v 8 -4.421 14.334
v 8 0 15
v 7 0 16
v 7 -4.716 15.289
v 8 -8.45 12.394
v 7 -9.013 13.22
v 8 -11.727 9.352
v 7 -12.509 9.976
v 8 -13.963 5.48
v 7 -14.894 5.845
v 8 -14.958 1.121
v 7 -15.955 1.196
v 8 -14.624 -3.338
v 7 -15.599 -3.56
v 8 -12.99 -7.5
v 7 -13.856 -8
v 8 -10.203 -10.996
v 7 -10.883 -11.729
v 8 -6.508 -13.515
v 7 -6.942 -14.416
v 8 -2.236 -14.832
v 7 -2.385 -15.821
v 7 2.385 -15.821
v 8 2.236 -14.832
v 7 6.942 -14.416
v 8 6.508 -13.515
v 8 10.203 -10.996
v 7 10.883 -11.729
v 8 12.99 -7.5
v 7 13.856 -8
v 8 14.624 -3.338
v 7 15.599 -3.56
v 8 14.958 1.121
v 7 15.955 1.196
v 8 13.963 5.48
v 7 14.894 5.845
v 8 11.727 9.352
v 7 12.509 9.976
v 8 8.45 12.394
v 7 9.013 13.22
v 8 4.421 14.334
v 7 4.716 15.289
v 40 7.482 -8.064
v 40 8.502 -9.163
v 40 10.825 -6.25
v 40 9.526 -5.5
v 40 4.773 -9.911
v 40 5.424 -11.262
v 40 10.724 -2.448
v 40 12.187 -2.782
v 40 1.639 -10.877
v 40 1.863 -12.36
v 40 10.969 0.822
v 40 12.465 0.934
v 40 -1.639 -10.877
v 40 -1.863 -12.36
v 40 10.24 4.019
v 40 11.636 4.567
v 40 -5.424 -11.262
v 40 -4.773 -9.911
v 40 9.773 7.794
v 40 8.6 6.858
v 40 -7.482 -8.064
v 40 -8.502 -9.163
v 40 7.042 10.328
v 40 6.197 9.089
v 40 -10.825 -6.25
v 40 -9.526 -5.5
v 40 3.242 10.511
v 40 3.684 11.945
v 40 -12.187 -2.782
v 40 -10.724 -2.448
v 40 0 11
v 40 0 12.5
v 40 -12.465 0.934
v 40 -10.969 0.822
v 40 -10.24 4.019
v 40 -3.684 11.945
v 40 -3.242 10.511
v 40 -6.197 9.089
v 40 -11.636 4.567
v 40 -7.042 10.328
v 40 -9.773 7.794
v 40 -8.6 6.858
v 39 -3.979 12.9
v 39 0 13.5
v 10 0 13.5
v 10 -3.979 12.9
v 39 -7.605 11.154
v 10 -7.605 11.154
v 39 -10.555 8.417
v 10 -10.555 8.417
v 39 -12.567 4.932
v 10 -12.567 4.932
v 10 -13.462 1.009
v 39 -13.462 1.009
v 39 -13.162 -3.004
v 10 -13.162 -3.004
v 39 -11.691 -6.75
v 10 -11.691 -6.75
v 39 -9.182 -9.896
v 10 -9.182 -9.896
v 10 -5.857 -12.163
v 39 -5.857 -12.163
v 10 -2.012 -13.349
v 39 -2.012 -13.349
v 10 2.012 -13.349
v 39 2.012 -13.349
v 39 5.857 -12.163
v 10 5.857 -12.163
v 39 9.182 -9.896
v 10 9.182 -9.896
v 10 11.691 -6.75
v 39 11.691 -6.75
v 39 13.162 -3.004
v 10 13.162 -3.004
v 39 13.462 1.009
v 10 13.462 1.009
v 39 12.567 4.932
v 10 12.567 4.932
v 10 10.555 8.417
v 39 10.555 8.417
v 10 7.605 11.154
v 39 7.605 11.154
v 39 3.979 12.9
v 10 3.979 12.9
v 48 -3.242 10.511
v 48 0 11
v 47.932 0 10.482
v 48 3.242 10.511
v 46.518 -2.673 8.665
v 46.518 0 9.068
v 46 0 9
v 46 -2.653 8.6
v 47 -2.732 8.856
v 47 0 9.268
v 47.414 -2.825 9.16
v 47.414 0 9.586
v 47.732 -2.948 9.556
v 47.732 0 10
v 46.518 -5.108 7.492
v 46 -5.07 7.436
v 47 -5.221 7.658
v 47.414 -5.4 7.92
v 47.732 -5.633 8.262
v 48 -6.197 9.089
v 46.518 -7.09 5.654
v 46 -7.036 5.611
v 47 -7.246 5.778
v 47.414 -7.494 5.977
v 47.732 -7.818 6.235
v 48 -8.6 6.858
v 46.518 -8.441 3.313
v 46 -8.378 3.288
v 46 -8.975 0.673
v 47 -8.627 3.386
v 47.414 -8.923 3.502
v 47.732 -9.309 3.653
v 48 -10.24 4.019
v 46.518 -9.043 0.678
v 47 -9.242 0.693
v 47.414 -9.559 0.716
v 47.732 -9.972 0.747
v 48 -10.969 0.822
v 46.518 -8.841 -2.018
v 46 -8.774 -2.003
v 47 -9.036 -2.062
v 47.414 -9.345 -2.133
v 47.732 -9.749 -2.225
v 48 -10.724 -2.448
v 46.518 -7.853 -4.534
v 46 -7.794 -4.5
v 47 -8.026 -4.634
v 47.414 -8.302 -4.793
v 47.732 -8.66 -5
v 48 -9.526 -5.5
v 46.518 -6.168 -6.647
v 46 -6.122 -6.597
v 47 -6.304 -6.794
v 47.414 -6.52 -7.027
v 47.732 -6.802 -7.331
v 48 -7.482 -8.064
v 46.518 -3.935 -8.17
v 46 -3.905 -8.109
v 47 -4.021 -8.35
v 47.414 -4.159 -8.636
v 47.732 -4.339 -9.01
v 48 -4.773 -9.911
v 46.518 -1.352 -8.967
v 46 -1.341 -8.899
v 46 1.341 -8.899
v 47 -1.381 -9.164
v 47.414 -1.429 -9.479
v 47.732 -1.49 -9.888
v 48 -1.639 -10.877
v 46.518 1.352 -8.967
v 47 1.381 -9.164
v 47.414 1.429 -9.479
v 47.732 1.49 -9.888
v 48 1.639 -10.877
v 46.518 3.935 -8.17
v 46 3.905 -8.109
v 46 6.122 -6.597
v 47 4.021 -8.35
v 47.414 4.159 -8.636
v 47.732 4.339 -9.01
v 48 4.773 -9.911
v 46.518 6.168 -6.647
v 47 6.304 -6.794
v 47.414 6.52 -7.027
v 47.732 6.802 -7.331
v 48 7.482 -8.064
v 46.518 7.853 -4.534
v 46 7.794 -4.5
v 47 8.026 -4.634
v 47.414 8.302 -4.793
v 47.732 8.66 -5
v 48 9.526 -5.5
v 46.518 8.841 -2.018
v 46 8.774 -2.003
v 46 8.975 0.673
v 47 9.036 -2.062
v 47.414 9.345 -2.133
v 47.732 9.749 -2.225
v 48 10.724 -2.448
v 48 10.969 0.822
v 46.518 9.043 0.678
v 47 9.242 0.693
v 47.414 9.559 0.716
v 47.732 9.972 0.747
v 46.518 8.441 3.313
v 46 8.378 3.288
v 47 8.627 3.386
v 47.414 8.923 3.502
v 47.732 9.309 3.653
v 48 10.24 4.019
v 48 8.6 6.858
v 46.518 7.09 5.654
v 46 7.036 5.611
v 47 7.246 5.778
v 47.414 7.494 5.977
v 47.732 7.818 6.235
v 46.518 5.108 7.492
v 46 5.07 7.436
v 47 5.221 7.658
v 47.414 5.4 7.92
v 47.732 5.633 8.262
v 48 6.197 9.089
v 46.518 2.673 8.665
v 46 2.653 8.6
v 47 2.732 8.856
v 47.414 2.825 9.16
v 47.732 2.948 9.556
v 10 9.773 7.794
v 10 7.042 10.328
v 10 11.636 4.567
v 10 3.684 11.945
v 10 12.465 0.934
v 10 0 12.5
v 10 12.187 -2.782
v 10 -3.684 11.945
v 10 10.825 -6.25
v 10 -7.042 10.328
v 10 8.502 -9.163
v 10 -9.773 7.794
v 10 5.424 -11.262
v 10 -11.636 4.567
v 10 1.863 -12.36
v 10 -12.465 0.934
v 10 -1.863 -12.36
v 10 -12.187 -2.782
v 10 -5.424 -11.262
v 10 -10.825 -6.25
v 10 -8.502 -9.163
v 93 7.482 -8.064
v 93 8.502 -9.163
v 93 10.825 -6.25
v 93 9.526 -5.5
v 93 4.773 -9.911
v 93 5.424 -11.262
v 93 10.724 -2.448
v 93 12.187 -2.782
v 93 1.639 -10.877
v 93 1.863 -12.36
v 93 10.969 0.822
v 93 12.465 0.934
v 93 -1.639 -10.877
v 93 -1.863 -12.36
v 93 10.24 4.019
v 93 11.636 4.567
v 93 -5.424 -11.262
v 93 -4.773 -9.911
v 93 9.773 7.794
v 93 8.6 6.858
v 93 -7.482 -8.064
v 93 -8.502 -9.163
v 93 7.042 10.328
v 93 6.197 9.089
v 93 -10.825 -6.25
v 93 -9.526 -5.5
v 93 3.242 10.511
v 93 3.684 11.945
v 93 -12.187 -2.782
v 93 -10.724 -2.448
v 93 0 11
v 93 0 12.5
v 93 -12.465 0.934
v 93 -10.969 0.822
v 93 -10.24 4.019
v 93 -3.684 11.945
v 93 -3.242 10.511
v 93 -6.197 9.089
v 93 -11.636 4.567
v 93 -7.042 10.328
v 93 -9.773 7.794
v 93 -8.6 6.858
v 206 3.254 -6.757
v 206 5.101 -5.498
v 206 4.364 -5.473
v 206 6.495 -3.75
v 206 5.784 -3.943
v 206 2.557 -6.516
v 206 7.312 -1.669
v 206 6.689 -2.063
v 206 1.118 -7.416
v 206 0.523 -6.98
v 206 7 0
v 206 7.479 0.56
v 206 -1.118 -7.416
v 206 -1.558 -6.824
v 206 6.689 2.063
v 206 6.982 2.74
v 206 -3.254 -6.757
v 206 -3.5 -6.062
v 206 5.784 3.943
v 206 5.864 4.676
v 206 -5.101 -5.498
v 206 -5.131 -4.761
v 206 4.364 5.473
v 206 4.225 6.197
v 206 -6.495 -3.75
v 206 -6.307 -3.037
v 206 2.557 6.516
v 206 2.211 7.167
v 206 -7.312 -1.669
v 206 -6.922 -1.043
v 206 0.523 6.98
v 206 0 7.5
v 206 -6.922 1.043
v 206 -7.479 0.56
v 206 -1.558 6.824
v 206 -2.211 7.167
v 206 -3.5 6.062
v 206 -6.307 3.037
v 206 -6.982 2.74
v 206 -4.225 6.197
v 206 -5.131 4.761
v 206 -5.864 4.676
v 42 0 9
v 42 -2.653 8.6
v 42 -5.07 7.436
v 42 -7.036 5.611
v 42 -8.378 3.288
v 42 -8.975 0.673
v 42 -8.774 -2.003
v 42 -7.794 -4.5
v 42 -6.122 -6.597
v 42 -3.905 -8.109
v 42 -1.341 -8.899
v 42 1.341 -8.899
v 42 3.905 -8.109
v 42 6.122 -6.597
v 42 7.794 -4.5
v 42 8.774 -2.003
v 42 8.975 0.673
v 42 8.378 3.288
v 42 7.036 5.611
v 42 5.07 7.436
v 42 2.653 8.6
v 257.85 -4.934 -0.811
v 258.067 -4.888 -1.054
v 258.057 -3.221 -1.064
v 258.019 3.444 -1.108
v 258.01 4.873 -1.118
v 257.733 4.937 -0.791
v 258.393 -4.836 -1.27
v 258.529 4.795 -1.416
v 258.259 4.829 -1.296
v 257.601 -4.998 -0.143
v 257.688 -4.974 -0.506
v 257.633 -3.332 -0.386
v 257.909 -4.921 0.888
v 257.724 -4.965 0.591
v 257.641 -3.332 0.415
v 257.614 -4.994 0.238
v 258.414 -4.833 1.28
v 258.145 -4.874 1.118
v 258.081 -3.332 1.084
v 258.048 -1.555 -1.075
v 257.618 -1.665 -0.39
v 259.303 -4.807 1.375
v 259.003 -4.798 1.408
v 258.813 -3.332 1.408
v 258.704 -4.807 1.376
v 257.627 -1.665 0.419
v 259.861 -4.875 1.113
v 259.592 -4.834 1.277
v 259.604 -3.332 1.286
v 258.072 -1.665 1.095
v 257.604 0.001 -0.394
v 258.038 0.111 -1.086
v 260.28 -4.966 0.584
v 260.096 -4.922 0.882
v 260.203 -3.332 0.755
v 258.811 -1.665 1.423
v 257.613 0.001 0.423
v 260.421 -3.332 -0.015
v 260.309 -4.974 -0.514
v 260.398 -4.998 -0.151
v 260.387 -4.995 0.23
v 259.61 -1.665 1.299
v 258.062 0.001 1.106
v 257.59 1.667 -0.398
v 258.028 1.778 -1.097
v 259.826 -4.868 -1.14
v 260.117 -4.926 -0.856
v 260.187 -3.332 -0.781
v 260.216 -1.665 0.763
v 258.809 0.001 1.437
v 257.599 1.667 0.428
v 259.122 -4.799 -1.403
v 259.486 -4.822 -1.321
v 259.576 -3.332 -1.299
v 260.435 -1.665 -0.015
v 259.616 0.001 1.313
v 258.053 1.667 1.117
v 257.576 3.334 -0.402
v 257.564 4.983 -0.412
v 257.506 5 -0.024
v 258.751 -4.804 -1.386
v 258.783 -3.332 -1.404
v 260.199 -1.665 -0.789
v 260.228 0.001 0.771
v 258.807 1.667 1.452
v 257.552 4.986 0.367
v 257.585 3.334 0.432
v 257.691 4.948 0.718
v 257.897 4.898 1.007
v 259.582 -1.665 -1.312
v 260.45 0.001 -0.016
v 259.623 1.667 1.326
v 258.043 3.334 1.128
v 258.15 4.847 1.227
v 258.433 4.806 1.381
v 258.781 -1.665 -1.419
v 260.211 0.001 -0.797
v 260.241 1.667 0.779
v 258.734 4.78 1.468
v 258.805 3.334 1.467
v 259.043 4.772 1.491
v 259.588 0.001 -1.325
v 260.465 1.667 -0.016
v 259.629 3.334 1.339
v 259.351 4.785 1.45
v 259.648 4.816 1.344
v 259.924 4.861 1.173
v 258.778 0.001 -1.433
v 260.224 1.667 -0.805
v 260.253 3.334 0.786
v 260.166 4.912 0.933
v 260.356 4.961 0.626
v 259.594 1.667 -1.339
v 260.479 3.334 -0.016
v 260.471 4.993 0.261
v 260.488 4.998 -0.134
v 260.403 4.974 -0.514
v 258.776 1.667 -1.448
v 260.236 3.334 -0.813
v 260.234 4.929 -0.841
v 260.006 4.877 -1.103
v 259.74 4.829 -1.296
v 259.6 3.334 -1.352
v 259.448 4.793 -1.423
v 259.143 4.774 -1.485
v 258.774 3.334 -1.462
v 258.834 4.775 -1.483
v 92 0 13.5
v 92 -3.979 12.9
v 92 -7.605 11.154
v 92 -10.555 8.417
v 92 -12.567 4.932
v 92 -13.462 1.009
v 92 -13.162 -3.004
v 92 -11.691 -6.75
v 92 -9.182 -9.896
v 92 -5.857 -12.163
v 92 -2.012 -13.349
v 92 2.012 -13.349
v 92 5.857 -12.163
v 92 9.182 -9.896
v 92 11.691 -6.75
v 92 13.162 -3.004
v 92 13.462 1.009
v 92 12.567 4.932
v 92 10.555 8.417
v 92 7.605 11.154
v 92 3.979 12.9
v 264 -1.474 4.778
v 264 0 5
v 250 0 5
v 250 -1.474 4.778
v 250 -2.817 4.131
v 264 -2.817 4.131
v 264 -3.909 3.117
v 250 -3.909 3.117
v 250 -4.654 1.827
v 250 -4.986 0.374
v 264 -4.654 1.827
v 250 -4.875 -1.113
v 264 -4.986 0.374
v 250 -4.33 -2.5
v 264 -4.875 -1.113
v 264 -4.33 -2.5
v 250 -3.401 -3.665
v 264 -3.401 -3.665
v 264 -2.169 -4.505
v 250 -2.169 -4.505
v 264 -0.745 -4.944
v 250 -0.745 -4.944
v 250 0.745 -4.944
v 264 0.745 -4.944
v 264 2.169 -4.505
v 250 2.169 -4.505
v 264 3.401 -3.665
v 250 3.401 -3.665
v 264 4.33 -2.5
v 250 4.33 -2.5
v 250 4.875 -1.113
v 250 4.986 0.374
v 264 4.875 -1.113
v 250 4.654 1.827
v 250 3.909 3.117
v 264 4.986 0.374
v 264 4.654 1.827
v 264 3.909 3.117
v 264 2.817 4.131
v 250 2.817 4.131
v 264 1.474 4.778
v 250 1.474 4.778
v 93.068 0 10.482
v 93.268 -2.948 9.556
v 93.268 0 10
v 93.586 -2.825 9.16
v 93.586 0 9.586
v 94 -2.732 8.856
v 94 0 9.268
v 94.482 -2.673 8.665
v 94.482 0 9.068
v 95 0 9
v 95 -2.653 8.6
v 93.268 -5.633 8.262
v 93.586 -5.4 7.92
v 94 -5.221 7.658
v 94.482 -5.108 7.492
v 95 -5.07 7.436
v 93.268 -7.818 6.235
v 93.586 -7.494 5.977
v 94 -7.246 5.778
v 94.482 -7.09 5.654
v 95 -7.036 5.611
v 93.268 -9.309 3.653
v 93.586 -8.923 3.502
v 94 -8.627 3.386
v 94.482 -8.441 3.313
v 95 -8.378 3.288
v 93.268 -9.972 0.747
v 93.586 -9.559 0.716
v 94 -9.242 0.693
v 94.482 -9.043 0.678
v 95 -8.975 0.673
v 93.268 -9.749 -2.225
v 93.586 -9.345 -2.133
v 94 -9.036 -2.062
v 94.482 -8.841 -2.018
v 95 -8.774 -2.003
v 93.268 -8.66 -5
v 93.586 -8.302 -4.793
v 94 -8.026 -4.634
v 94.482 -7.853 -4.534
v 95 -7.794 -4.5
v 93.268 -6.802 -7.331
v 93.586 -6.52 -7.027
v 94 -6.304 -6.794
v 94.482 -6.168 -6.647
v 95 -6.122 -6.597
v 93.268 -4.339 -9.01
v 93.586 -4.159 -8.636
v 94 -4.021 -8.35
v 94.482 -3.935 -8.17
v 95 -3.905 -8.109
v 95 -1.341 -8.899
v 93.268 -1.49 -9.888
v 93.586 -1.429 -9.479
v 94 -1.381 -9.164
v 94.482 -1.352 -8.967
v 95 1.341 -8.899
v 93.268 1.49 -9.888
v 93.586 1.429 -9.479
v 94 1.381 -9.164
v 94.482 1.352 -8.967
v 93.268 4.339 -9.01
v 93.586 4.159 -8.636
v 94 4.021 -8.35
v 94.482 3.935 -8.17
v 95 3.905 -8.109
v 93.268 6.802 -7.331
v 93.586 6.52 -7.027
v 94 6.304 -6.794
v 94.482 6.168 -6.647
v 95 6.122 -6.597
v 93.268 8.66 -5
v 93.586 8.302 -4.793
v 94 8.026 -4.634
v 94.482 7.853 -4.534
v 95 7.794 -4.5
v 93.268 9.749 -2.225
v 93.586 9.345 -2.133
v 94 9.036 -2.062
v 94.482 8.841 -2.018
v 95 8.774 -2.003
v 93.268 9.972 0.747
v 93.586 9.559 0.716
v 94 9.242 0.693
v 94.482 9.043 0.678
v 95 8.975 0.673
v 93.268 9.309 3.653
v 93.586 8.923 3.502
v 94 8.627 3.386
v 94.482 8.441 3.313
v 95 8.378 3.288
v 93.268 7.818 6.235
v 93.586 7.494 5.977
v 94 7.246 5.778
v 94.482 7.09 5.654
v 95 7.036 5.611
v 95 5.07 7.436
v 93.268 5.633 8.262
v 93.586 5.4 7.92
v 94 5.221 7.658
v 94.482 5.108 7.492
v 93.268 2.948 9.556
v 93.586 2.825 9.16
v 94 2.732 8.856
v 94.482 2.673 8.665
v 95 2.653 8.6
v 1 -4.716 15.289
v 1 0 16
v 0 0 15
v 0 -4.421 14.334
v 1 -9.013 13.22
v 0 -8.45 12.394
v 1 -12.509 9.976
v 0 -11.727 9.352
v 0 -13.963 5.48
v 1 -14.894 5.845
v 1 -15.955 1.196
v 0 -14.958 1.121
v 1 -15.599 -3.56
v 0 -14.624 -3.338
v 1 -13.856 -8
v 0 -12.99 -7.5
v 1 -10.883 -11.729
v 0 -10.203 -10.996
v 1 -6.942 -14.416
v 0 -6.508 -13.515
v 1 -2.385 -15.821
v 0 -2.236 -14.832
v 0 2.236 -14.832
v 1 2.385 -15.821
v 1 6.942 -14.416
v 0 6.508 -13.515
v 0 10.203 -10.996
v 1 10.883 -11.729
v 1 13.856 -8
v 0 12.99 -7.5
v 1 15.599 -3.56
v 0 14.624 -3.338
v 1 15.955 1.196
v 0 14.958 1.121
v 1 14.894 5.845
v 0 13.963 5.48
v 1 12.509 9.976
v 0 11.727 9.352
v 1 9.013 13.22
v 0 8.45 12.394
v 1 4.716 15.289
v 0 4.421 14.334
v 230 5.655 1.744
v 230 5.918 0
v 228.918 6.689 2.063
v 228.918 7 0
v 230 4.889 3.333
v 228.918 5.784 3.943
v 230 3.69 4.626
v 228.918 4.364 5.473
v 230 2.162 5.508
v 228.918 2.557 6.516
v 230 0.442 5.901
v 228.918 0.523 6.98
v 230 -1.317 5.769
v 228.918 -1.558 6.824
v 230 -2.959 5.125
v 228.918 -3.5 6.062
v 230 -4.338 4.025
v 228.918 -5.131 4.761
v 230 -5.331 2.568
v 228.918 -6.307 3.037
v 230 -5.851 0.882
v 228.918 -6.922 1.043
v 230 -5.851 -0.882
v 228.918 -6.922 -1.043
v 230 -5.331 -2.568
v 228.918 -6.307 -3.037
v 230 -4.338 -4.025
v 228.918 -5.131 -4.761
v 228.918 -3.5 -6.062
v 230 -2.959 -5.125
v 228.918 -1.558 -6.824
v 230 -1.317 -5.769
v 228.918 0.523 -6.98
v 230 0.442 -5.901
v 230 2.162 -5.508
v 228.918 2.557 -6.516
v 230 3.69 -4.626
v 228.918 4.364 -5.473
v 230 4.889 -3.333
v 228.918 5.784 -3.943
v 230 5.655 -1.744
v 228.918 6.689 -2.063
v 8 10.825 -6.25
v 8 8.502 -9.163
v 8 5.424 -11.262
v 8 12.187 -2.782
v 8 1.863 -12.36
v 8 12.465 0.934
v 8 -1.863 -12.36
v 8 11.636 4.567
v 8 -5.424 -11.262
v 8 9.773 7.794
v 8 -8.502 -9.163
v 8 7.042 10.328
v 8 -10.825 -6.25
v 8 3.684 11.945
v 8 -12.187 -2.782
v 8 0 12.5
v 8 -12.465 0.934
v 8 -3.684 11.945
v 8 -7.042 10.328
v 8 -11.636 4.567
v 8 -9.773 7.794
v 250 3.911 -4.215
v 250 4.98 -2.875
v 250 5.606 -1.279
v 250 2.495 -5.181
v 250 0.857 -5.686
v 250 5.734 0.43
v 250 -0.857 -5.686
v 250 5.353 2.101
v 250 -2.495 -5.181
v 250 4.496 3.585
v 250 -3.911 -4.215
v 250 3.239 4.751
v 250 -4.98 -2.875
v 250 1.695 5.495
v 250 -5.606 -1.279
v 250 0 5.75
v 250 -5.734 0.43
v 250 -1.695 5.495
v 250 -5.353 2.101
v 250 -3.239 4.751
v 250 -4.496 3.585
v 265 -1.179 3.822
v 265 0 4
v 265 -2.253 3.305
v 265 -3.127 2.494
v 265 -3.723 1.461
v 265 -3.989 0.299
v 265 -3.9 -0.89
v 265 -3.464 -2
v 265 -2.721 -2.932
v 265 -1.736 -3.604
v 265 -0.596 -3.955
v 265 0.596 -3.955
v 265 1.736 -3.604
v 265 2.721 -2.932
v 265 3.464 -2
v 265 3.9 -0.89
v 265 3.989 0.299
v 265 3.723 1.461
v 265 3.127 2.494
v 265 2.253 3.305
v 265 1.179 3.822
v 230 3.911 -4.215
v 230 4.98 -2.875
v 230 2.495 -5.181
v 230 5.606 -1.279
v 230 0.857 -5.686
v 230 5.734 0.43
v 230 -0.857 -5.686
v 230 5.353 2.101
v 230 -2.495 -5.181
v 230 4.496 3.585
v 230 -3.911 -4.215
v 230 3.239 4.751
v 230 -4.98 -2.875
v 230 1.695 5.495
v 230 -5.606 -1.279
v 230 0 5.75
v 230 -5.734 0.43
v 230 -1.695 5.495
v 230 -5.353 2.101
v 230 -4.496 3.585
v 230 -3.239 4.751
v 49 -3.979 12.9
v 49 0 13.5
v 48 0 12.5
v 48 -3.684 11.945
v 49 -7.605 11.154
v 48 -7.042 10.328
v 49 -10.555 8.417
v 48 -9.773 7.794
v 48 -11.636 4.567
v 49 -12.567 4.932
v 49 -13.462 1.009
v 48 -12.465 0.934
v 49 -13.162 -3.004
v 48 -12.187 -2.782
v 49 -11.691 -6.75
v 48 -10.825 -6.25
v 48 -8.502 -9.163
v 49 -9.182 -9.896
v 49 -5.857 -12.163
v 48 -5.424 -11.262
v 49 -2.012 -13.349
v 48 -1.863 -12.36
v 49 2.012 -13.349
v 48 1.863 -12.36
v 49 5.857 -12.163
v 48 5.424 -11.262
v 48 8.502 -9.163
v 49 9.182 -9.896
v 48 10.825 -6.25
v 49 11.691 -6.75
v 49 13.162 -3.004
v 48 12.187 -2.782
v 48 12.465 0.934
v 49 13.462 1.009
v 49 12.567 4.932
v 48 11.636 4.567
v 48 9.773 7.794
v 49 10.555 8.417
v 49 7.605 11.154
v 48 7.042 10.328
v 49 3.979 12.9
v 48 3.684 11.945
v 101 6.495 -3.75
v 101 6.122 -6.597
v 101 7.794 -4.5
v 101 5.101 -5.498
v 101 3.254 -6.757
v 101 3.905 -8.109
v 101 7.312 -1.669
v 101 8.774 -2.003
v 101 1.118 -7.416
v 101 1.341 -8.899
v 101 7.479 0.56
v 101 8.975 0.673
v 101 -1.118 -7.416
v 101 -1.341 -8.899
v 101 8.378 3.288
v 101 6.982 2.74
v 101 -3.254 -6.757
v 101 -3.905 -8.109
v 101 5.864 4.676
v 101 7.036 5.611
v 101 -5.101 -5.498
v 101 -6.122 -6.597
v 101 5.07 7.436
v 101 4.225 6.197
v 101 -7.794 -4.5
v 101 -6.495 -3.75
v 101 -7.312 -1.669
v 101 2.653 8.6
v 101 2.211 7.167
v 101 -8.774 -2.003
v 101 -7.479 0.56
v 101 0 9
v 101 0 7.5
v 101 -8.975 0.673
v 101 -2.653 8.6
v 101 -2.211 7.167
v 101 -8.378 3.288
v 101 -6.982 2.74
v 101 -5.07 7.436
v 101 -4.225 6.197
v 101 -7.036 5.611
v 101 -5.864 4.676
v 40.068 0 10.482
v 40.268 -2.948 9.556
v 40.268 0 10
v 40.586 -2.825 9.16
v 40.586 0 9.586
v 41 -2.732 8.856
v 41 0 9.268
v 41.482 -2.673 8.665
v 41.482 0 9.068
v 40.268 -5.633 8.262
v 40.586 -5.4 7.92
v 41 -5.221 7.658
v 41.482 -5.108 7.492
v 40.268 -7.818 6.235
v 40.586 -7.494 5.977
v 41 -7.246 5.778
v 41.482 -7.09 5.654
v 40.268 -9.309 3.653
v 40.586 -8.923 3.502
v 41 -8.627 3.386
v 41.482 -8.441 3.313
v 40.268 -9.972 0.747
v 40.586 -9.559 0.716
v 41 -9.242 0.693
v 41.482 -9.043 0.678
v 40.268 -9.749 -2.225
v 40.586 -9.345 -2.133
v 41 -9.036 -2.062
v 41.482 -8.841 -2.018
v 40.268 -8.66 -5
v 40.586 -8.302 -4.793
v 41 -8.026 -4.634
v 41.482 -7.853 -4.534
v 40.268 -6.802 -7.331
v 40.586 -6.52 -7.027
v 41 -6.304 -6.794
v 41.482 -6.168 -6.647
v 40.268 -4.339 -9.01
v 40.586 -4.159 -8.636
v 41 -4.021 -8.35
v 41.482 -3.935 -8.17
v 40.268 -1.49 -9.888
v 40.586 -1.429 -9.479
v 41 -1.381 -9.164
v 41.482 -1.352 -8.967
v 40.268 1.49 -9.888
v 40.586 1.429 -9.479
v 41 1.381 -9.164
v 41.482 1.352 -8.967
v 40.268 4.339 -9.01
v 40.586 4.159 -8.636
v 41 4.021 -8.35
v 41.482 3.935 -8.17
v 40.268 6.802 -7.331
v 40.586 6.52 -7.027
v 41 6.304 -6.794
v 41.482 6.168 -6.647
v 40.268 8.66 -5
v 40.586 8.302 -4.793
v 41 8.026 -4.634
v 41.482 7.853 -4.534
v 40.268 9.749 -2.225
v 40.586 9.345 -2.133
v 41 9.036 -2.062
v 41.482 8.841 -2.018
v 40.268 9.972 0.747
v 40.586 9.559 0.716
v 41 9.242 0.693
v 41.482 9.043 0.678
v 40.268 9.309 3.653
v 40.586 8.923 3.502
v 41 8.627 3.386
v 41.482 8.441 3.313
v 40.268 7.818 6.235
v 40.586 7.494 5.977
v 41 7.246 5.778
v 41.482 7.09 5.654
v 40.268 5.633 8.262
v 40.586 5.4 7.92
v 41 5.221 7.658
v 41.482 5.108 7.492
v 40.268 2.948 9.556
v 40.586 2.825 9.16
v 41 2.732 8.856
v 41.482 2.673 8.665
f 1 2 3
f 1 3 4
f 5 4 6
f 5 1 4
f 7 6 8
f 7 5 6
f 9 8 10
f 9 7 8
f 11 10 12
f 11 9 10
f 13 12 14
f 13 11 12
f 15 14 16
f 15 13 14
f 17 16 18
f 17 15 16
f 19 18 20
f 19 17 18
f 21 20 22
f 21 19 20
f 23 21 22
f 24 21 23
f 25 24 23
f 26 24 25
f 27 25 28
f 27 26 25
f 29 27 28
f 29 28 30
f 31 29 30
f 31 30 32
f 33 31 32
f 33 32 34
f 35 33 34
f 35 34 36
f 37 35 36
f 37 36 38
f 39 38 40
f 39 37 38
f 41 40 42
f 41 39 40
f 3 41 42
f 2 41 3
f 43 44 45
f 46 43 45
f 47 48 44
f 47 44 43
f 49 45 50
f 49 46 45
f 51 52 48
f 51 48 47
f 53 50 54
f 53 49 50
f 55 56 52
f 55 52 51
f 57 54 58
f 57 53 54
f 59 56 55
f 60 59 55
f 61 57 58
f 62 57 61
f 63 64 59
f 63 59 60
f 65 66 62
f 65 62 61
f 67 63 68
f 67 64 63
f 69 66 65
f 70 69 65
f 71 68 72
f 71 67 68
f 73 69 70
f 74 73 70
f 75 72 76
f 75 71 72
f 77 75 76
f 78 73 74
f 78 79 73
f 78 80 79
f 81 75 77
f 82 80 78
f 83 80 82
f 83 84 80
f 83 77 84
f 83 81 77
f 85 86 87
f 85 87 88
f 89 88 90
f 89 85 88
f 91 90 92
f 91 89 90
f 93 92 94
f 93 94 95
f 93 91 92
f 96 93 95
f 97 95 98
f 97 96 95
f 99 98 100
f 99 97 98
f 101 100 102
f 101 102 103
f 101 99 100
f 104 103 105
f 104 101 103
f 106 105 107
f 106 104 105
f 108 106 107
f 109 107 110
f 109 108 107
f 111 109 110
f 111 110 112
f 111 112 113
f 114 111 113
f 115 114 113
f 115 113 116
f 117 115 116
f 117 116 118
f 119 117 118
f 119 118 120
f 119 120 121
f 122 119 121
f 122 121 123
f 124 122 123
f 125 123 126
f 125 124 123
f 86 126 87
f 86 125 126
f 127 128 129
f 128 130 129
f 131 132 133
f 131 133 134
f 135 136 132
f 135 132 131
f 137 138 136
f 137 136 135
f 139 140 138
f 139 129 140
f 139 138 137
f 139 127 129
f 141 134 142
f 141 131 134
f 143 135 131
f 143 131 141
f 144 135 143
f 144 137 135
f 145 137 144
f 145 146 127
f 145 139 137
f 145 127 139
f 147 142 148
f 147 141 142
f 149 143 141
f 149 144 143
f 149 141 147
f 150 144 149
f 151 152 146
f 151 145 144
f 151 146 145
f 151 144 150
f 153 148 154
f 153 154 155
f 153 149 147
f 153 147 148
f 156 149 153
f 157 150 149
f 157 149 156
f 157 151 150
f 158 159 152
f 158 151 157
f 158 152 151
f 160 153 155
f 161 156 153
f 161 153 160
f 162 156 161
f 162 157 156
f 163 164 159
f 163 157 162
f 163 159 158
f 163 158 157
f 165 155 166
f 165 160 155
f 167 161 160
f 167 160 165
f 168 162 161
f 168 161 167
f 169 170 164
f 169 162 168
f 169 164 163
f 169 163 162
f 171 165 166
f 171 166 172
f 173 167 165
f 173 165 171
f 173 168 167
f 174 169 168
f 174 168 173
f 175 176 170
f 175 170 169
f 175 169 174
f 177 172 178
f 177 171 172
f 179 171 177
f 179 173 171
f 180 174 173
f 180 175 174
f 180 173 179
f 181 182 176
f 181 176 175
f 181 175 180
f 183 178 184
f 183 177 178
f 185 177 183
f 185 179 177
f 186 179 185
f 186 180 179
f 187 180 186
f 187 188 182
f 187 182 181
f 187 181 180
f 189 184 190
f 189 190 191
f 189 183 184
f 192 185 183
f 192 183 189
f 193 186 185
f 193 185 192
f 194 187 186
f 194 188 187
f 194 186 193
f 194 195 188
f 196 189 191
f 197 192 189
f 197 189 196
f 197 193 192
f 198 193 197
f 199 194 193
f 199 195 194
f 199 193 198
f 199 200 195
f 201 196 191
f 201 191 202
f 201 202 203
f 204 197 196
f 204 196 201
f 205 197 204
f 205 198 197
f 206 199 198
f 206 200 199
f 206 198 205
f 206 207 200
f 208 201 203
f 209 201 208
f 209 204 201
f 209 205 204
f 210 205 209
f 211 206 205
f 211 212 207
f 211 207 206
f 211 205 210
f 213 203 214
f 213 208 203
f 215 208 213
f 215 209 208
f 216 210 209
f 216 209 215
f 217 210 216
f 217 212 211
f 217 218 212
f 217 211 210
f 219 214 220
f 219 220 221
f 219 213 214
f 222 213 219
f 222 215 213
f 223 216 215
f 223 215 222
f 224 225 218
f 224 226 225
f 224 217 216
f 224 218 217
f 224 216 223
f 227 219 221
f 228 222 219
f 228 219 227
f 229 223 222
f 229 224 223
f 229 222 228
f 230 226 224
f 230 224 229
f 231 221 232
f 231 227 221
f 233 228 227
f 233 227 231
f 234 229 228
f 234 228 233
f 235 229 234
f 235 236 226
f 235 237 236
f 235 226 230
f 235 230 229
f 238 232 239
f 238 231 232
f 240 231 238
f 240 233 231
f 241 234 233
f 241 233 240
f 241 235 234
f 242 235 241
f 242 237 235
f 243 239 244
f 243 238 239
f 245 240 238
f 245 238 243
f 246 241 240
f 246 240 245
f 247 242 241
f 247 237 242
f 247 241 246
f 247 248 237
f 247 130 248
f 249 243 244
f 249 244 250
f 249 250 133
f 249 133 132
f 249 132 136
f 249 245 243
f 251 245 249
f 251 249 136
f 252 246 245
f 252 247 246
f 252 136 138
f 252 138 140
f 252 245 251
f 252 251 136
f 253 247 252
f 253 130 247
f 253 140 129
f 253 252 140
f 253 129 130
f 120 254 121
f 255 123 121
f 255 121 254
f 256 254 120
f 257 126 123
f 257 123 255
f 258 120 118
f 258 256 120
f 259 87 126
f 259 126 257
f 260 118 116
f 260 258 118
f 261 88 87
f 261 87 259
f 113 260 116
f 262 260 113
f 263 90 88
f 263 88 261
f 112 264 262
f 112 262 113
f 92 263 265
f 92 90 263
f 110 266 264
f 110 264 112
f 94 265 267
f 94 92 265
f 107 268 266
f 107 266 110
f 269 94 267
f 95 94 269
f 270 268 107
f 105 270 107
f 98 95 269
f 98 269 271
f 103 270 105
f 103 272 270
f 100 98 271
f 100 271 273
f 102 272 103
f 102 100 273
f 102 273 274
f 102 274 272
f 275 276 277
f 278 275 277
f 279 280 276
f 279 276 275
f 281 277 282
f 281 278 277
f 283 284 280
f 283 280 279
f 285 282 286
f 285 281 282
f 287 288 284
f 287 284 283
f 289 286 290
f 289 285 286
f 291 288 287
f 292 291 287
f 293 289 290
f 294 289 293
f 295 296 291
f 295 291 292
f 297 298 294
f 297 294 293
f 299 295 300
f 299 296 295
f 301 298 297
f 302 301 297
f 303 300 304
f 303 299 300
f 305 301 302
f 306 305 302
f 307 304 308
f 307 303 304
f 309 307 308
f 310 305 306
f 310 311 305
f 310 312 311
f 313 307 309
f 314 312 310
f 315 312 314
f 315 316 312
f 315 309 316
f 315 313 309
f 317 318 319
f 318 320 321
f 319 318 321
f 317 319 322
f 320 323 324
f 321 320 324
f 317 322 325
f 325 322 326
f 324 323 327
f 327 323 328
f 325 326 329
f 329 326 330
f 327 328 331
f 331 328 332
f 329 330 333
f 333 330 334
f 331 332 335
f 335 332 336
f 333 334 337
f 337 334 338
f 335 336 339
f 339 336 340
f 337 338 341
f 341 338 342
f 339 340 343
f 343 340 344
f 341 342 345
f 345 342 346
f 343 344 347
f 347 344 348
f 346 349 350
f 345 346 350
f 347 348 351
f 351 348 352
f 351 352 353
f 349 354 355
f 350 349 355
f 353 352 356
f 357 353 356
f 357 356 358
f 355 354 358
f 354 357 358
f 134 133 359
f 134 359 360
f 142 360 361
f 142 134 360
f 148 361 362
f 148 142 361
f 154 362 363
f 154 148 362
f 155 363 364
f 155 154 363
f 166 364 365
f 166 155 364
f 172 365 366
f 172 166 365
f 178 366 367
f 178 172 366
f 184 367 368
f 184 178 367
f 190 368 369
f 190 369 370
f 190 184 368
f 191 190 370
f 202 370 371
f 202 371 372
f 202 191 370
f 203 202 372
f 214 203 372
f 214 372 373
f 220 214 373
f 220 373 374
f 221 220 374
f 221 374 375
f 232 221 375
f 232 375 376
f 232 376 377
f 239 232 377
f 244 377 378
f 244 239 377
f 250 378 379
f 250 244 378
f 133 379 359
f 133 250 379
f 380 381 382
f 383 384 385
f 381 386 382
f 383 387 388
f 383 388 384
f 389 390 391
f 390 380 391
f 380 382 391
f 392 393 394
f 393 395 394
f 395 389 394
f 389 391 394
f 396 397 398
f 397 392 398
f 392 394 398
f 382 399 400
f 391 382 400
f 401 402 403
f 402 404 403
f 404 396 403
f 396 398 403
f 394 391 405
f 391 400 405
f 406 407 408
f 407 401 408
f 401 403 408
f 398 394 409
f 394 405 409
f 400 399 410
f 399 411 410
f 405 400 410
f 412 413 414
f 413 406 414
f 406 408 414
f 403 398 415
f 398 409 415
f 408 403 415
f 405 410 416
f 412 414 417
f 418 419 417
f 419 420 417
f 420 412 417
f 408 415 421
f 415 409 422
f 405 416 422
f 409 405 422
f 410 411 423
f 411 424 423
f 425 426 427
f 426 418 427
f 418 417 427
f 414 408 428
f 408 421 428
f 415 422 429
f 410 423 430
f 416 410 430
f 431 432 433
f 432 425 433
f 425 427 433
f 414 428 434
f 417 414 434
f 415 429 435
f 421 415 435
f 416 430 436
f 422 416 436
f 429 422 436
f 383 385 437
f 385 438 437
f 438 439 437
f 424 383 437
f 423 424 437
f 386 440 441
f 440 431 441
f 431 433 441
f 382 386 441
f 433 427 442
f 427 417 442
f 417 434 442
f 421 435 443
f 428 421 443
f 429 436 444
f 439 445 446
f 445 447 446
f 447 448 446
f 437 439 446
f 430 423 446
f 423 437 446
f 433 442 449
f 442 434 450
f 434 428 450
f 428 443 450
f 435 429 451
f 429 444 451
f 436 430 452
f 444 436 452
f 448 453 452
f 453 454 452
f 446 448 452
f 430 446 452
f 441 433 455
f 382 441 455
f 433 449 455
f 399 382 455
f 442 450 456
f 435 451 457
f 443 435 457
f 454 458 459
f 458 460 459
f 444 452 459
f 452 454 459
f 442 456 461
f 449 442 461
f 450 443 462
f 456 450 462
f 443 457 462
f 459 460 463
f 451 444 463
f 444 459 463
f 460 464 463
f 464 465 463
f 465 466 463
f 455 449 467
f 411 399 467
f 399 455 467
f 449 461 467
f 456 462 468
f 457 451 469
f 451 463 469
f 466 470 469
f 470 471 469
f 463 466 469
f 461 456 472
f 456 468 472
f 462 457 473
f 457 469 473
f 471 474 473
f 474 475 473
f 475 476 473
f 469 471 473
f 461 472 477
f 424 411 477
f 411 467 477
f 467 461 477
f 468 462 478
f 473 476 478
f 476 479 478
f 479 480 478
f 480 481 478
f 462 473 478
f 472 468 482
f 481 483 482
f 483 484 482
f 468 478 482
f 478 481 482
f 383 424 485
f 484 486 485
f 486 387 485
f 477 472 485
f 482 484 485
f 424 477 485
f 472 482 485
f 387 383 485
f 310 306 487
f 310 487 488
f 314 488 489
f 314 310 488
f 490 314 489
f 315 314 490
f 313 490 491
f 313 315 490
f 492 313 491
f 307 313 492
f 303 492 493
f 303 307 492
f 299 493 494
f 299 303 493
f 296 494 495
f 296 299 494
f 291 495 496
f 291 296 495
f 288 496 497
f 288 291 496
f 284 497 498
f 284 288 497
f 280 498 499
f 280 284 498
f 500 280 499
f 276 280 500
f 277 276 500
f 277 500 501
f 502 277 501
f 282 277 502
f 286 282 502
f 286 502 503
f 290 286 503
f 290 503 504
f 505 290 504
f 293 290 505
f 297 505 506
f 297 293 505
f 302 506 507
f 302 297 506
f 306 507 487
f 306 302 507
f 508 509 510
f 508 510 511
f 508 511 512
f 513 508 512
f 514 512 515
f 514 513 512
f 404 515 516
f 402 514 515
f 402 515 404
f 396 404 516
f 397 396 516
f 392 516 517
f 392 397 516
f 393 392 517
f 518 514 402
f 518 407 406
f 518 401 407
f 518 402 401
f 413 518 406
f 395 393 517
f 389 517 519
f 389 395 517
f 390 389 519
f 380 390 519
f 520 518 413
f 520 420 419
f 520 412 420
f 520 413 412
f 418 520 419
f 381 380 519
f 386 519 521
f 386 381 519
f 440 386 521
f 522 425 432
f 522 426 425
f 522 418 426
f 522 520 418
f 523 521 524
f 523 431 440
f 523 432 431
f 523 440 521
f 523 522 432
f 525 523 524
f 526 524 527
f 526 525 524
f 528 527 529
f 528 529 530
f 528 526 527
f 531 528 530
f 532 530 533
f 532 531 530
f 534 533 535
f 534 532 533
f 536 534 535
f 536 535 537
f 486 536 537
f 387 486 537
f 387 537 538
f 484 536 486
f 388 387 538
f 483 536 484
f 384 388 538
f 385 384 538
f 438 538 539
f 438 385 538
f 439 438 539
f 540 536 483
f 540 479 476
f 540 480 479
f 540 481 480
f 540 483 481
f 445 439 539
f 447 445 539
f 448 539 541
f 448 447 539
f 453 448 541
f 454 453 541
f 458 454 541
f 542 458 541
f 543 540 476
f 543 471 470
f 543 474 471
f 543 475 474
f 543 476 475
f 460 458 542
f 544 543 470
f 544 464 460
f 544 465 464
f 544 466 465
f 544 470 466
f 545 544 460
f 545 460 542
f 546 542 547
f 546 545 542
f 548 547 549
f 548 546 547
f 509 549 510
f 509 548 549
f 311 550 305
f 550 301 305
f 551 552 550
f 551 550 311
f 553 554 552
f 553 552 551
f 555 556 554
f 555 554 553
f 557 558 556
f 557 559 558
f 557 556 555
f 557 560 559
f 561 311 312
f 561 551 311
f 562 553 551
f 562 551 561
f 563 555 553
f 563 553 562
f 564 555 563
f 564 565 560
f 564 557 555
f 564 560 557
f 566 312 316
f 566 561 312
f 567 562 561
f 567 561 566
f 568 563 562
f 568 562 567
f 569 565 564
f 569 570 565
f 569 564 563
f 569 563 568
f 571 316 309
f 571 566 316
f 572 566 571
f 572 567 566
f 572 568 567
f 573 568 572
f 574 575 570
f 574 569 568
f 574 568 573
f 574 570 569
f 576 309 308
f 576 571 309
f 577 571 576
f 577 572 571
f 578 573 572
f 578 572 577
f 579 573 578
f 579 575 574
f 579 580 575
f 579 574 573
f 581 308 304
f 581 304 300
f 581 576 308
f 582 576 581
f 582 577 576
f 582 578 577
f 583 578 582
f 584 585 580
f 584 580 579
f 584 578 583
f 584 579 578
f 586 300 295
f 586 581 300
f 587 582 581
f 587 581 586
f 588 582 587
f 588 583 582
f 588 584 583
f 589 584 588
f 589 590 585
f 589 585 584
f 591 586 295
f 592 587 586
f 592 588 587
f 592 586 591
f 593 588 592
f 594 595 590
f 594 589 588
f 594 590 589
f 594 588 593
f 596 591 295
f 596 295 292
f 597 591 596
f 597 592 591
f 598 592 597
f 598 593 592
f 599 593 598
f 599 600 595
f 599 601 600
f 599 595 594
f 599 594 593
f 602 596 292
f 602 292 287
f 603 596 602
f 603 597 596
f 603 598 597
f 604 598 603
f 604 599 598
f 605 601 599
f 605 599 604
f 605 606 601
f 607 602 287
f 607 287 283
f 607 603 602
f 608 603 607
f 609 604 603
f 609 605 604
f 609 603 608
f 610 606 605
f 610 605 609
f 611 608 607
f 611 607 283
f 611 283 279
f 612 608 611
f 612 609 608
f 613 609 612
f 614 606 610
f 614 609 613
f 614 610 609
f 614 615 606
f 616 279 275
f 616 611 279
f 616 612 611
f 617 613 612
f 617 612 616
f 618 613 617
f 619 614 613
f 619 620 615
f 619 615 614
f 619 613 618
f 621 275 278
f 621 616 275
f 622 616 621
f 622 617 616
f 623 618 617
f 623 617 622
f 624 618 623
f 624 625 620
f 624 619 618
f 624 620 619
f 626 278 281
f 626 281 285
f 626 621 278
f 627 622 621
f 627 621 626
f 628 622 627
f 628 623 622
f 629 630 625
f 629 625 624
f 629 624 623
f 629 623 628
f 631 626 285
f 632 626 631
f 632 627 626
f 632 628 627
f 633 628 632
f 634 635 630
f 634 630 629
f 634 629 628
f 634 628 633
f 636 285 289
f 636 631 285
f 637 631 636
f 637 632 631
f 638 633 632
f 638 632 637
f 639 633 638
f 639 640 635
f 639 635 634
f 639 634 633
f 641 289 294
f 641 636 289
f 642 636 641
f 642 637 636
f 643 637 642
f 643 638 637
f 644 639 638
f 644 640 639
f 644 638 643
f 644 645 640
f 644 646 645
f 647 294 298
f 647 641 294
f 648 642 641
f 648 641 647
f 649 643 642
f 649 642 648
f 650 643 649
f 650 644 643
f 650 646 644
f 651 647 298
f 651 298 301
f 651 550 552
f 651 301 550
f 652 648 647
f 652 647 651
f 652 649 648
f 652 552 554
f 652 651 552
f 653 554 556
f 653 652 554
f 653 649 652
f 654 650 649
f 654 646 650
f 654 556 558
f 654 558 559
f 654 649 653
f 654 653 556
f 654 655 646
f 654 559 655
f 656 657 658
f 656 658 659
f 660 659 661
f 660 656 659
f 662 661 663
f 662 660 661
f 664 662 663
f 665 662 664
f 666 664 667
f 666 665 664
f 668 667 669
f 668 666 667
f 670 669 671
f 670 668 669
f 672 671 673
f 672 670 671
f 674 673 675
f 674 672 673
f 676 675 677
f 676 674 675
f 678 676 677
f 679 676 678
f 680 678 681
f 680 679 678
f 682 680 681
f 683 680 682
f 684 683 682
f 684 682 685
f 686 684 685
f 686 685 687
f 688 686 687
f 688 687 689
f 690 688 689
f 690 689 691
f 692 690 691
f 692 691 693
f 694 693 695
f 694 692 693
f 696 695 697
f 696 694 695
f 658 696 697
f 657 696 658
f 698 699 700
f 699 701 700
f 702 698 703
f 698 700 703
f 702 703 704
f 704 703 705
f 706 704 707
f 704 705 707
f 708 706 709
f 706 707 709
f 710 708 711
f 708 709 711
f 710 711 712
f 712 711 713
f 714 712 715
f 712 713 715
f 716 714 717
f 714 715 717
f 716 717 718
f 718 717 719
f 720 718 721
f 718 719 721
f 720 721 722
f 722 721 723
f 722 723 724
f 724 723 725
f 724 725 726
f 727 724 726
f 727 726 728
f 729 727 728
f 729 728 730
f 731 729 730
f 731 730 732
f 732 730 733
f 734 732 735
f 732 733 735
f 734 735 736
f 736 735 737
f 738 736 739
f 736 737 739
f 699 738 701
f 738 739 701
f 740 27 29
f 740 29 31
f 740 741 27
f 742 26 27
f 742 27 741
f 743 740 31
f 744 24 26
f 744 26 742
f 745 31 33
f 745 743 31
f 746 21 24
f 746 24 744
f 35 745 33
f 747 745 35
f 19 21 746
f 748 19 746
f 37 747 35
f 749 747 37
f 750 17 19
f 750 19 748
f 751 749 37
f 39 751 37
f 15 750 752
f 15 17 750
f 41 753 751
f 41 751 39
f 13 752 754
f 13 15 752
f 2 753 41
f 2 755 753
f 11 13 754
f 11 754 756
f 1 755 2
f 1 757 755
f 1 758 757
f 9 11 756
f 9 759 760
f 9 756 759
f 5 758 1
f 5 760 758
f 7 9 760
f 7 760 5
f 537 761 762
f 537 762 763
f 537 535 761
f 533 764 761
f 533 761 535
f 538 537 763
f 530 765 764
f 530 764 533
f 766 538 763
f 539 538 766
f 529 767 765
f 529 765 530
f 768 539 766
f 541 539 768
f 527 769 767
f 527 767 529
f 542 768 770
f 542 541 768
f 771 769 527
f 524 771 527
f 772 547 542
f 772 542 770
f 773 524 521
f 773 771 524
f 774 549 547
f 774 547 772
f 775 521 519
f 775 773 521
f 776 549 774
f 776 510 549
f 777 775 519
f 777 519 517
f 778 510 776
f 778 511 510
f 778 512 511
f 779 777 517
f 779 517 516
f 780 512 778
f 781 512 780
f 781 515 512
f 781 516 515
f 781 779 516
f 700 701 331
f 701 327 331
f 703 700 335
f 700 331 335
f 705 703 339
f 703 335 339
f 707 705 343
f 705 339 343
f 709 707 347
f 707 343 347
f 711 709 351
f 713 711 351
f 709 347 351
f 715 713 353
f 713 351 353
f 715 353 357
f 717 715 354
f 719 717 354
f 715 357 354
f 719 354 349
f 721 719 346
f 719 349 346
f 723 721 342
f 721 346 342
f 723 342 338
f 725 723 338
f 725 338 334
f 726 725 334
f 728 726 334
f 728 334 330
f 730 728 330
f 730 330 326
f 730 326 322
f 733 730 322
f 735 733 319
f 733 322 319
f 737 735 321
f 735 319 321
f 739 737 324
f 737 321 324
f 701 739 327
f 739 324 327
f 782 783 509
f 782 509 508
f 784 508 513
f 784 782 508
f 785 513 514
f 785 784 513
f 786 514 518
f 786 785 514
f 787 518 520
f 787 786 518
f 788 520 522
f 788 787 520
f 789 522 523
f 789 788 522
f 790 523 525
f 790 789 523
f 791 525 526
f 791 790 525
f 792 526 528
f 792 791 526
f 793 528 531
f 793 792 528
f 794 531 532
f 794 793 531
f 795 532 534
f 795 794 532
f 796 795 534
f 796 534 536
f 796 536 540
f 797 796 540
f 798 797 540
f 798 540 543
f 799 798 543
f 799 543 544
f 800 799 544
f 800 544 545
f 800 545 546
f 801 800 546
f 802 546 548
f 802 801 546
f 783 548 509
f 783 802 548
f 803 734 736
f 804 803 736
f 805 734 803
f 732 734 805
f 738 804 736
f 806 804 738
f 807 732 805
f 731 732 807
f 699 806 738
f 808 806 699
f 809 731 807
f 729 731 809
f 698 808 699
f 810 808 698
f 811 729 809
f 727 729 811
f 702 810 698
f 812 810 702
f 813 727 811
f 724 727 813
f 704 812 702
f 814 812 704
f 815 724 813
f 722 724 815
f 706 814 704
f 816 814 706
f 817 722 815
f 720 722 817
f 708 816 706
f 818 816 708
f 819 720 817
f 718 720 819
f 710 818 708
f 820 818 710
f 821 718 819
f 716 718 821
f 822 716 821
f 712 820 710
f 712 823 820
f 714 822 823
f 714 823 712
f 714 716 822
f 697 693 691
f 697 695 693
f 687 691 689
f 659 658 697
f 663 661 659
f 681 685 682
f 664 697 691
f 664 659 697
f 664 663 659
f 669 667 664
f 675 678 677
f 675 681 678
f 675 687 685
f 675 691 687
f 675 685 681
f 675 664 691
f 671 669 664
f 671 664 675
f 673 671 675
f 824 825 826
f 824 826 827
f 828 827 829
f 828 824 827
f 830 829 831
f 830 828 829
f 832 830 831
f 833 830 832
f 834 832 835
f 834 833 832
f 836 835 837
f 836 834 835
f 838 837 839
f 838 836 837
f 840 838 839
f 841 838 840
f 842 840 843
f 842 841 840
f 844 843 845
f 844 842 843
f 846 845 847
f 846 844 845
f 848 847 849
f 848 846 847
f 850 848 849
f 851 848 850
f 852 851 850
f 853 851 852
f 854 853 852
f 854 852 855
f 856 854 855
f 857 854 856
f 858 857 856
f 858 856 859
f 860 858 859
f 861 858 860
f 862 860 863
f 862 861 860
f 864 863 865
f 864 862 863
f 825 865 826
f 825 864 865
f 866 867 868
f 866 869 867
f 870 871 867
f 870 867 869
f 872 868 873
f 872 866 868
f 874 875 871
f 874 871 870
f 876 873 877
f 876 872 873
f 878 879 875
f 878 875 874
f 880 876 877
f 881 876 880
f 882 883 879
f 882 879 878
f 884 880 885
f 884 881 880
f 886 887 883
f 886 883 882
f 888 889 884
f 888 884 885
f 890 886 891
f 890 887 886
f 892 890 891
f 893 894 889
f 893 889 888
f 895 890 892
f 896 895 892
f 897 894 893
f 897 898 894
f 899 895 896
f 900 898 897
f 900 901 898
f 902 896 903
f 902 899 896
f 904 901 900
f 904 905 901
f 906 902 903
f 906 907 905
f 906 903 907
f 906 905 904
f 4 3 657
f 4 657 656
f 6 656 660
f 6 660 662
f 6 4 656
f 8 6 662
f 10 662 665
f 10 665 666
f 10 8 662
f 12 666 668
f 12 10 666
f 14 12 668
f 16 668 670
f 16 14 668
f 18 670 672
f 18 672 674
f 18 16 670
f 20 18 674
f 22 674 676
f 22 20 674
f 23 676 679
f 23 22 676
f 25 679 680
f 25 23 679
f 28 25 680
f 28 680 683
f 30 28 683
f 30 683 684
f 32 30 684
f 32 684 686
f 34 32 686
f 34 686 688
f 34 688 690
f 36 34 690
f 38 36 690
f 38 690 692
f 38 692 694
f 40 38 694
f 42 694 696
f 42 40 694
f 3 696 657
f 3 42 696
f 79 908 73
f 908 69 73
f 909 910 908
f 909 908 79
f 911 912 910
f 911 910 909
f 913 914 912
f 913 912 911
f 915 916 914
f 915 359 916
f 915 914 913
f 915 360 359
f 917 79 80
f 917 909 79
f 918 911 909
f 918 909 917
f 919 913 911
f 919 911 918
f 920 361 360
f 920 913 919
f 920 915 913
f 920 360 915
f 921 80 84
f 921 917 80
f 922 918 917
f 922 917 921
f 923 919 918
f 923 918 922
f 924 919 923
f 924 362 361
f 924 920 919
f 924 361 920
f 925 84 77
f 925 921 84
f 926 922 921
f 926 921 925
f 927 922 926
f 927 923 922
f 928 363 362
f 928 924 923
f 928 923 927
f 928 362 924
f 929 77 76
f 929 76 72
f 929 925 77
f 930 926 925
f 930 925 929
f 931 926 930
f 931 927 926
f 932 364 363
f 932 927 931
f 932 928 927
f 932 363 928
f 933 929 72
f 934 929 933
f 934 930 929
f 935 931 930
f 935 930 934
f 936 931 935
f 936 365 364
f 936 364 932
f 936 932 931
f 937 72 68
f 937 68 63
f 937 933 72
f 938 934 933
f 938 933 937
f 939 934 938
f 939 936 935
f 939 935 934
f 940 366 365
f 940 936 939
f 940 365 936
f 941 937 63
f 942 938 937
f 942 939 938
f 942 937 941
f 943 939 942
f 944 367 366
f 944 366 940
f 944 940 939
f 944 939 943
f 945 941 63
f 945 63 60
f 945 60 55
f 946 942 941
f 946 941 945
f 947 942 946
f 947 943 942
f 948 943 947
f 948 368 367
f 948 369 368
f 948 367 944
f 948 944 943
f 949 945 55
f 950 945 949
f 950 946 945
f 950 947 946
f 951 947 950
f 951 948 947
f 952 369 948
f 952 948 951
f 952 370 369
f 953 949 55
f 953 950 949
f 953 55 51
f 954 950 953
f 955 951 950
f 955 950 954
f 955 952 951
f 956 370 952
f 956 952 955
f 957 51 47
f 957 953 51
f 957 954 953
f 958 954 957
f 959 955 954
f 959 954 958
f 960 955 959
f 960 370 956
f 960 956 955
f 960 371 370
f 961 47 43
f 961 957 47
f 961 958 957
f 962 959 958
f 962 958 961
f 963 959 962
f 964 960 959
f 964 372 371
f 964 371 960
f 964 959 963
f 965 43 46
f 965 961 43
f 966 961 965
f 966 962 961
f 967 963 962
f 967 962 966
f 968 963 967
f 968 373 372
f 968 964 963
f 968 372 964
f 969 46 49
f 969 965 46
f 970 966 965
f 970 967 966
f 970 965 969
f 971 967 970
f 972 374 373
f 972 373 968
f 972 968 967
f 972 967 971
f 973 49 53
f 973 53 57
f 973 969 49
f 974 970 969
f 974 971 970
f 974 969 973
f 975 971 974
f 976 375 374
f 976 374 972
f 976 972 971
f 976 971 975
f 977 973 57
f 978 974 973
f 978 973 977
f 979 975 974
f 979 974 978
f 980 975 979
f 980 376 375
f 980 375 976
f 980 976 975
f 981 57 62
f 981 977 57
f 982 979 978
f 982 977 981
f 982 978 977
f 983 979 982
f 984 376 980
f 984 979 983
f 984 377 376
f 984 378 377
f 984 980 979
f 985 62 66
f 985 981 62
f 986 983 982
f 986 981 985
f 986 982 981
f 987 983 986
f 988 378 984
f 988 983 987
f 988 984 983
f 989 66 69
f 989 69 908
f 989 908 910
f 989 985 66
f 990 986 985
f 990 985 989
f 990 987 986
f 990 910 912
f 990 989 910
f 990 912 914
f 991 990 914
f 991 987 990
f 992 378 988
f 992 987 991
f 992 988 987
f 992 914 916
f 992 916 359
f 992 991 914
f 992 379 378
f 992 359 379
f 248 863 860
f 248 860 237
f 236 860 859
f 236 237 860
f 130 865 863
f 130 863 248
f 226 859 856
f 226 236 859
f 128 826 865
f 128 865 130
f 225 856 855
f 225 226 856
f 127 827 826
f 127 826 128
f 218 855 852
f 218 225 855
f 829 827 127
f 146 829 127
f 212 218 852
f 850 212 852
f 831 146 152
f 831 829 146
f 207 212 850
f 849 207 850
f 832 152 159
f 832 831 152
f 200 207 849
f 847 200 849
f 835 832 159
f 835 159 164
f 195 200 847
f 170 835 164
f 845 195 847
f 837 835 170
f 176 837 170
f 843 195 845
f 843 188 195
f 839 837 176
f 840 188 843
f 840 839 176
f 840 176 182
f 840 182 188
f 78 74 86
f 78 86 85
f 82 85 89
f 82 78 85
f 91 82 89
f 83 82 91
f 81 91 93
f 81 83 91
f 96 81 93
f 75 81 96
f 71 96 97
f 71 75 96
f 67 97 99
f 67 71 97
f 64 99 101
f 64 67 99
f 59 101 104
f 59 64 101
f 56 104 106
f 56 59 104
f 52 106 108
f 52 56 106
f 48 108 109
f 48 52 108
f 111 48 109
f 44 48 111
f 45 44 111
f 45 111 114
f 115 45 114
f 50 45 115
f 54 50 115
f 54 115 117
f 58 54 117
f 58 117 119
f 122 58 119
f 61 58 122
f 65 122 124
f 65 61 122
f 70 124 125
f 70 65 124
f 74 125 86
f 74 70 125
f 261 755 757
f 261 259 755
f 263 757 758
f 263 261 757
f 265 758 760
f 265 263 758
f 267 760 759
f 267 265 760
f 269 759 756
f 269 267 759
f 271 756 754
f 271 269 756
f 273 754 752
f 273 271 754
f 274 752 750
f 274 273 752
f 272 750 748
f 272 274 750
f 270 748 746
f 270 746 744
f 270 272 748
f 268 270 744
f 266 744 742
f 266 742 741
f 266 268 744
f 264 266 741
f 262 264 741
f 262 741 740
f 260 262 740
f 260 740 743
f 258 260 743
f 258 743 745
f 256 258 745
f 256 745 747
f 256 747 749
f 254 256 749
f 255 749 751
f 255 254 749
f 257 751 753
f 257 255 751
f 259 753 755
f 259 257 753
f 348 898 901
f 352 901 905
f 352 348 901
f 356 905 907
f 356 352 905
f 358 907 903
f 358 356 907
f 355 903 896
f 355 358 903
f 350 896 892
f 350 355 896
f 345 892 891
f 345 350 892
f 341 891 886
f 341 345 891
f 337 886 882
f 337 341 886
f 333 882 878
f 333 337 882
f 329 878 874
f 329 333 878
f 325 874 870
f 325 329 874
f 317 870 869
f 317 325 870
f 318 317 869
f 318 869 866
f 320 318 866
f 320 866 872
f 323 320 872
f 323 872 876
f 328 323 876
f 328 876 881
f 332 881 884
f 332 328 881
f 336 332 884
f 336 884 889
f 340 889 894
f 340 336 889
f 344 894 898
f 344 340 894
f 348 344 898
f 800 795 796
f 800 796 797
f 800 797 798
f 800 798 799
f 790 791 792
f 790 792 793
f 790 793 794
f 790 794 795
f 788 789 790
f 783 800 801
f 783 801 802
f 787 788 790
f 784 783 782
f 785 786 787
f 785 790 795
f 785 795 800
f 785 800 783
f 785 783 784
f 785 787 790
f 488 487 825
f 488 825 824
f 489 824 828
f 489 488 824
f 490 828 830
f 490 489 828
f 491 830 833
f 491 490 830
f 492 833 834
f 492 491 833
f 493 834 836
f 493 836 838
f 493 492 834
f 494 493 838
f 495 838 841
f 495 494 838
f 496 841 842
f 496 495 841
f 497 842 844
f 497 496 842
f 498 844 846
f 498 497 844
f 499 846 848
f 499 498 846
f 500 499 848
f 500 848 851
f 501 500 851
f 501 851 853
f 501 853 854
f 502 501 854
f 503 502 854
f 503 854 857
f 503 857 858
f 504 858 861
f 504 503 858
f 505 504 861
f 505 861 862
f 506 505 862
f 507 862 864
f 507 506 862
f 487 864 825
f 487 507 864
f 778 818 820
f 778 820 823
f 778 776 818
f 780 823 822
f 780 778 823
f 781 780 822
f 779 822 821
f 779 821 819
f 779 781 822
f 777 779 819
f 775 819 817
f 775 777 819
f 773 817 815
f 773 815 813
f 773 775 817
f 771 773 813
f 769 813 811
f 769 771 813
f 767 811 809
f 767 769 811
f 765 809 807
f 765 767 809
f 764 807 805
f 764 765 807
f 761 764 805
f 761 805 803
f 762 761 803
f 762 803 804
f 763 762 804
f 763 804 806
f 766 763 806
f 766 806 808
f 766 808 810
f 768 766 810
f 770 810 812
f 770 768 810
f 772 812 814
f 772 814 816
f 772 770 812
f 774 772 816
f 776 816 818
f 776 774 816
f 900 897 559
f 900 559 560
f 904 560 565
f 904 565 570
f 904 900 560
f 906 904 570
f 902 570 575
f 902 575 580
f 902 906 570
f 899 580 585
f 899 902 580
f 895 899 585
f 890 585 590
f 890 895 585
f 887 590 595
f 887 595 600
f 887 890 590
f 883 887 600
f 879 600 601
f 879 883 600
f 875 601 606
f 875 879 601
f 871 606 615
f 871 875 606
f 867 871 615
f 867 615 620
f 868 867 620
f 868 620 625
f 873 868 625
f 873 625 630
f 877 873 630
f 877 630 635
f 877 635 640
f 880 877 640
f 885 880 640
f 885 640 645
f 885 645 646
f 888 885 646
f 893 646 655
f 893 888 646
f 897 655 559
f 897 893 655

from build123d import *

# Parameters (mm, degrees)
CHAMFER_1_SIZE = 1
FILLET_1_R     = 2
FILLET_2_R     = 2


# Read off the part's stored shape, not the designer's step: M14 机械螺纹 螺柱1
with BuildPart() as part:
    # 草图1 → 旋转1 (revolve)
    with BuildSketch(Plane.XY, mode=Mode.PRIVATE) as revolve_1_sk:
        Polygon((0, 0), (0, 16), (8, 16), (8, 12.5), (10, 12.5), (10, 13.5), (40, 13.5), (40, 9), (48, 9), (48, 13.5), (93, 13.5), (93, 9), (101, 9), (101, 7.5), (230, 7.5), (230, 5.75), (250, 5.75), (250, 5), (265, 5), (265, 0), align=None)
    revolve(revolve_1_sk.sketch.rotate(Axis((0, 0, 0), (1, 0, 0)), 90), axis=Axis((0, 0, 0), (1, 0, 0)))

    # M14 机械螺纹 螺柱1 outline → M14 机械螺纹 螺柱1 (revolve, cut)
    with BuildSketch(Plane.YX):
        Polygon((7.5, 230), (5.9175, 230), (7, 228.9175), (7, 206), (7.5, 206), align=None)
    revolve(axis=Axis((0, 0, 0), (1, 0, 0)), mode=Mode.SUBTRACT)

    # 草图3 → 切除-旋转1 (revolve, cut)
    with BuildSketch(Plane.XY, mode=Mode.PRIVATE) as cut_revolve_1_sk:
        Polygon((259, -5.697872022), (260.4, -5.697872022), (260.5, 5.677594139), (259, 5.677594139), align=None)
    revolve(cut_revolve_1_sk.sketch.rotate(Axis((259, -22.643842163, 0), (0, 1, 0)), 131.522767303), axis=Axis((259, -22.643842163, 0), (0, 1, 0)), mode=Mode.SUBTRACT)

    # 倒角1
    chamfer_1_edges = [part.edges().sort_by_distance(p)[0] for p in [
        (265, 0, -5),
        (93, 0, -13.5),
        (48, 0, -13.5),
        (40, 0, -13.5),
        (8, 0, -16),
        (0, 0, -16),
    ]]
    chamfer(chamfer_1_edges, length=CHAMFER_1_SIZE)

    # 圆角1
    fillet_1_edges = [part.edges().sort_by_distance(p)[0] for p in [
        (48, 0, -9),
        (40, 0, -9),
    ]]
    fillet(fillet_1_edges, radius=FILLET_1_R)

    # 圆角2
    fillet_2_edges = [part.edges().sort_by_distance(p)[0] for p in [
        (93, 0, -9),
    ]]
    fillet(fillet_2_edges, radius=FILLET_2_R)


solid = part.part
